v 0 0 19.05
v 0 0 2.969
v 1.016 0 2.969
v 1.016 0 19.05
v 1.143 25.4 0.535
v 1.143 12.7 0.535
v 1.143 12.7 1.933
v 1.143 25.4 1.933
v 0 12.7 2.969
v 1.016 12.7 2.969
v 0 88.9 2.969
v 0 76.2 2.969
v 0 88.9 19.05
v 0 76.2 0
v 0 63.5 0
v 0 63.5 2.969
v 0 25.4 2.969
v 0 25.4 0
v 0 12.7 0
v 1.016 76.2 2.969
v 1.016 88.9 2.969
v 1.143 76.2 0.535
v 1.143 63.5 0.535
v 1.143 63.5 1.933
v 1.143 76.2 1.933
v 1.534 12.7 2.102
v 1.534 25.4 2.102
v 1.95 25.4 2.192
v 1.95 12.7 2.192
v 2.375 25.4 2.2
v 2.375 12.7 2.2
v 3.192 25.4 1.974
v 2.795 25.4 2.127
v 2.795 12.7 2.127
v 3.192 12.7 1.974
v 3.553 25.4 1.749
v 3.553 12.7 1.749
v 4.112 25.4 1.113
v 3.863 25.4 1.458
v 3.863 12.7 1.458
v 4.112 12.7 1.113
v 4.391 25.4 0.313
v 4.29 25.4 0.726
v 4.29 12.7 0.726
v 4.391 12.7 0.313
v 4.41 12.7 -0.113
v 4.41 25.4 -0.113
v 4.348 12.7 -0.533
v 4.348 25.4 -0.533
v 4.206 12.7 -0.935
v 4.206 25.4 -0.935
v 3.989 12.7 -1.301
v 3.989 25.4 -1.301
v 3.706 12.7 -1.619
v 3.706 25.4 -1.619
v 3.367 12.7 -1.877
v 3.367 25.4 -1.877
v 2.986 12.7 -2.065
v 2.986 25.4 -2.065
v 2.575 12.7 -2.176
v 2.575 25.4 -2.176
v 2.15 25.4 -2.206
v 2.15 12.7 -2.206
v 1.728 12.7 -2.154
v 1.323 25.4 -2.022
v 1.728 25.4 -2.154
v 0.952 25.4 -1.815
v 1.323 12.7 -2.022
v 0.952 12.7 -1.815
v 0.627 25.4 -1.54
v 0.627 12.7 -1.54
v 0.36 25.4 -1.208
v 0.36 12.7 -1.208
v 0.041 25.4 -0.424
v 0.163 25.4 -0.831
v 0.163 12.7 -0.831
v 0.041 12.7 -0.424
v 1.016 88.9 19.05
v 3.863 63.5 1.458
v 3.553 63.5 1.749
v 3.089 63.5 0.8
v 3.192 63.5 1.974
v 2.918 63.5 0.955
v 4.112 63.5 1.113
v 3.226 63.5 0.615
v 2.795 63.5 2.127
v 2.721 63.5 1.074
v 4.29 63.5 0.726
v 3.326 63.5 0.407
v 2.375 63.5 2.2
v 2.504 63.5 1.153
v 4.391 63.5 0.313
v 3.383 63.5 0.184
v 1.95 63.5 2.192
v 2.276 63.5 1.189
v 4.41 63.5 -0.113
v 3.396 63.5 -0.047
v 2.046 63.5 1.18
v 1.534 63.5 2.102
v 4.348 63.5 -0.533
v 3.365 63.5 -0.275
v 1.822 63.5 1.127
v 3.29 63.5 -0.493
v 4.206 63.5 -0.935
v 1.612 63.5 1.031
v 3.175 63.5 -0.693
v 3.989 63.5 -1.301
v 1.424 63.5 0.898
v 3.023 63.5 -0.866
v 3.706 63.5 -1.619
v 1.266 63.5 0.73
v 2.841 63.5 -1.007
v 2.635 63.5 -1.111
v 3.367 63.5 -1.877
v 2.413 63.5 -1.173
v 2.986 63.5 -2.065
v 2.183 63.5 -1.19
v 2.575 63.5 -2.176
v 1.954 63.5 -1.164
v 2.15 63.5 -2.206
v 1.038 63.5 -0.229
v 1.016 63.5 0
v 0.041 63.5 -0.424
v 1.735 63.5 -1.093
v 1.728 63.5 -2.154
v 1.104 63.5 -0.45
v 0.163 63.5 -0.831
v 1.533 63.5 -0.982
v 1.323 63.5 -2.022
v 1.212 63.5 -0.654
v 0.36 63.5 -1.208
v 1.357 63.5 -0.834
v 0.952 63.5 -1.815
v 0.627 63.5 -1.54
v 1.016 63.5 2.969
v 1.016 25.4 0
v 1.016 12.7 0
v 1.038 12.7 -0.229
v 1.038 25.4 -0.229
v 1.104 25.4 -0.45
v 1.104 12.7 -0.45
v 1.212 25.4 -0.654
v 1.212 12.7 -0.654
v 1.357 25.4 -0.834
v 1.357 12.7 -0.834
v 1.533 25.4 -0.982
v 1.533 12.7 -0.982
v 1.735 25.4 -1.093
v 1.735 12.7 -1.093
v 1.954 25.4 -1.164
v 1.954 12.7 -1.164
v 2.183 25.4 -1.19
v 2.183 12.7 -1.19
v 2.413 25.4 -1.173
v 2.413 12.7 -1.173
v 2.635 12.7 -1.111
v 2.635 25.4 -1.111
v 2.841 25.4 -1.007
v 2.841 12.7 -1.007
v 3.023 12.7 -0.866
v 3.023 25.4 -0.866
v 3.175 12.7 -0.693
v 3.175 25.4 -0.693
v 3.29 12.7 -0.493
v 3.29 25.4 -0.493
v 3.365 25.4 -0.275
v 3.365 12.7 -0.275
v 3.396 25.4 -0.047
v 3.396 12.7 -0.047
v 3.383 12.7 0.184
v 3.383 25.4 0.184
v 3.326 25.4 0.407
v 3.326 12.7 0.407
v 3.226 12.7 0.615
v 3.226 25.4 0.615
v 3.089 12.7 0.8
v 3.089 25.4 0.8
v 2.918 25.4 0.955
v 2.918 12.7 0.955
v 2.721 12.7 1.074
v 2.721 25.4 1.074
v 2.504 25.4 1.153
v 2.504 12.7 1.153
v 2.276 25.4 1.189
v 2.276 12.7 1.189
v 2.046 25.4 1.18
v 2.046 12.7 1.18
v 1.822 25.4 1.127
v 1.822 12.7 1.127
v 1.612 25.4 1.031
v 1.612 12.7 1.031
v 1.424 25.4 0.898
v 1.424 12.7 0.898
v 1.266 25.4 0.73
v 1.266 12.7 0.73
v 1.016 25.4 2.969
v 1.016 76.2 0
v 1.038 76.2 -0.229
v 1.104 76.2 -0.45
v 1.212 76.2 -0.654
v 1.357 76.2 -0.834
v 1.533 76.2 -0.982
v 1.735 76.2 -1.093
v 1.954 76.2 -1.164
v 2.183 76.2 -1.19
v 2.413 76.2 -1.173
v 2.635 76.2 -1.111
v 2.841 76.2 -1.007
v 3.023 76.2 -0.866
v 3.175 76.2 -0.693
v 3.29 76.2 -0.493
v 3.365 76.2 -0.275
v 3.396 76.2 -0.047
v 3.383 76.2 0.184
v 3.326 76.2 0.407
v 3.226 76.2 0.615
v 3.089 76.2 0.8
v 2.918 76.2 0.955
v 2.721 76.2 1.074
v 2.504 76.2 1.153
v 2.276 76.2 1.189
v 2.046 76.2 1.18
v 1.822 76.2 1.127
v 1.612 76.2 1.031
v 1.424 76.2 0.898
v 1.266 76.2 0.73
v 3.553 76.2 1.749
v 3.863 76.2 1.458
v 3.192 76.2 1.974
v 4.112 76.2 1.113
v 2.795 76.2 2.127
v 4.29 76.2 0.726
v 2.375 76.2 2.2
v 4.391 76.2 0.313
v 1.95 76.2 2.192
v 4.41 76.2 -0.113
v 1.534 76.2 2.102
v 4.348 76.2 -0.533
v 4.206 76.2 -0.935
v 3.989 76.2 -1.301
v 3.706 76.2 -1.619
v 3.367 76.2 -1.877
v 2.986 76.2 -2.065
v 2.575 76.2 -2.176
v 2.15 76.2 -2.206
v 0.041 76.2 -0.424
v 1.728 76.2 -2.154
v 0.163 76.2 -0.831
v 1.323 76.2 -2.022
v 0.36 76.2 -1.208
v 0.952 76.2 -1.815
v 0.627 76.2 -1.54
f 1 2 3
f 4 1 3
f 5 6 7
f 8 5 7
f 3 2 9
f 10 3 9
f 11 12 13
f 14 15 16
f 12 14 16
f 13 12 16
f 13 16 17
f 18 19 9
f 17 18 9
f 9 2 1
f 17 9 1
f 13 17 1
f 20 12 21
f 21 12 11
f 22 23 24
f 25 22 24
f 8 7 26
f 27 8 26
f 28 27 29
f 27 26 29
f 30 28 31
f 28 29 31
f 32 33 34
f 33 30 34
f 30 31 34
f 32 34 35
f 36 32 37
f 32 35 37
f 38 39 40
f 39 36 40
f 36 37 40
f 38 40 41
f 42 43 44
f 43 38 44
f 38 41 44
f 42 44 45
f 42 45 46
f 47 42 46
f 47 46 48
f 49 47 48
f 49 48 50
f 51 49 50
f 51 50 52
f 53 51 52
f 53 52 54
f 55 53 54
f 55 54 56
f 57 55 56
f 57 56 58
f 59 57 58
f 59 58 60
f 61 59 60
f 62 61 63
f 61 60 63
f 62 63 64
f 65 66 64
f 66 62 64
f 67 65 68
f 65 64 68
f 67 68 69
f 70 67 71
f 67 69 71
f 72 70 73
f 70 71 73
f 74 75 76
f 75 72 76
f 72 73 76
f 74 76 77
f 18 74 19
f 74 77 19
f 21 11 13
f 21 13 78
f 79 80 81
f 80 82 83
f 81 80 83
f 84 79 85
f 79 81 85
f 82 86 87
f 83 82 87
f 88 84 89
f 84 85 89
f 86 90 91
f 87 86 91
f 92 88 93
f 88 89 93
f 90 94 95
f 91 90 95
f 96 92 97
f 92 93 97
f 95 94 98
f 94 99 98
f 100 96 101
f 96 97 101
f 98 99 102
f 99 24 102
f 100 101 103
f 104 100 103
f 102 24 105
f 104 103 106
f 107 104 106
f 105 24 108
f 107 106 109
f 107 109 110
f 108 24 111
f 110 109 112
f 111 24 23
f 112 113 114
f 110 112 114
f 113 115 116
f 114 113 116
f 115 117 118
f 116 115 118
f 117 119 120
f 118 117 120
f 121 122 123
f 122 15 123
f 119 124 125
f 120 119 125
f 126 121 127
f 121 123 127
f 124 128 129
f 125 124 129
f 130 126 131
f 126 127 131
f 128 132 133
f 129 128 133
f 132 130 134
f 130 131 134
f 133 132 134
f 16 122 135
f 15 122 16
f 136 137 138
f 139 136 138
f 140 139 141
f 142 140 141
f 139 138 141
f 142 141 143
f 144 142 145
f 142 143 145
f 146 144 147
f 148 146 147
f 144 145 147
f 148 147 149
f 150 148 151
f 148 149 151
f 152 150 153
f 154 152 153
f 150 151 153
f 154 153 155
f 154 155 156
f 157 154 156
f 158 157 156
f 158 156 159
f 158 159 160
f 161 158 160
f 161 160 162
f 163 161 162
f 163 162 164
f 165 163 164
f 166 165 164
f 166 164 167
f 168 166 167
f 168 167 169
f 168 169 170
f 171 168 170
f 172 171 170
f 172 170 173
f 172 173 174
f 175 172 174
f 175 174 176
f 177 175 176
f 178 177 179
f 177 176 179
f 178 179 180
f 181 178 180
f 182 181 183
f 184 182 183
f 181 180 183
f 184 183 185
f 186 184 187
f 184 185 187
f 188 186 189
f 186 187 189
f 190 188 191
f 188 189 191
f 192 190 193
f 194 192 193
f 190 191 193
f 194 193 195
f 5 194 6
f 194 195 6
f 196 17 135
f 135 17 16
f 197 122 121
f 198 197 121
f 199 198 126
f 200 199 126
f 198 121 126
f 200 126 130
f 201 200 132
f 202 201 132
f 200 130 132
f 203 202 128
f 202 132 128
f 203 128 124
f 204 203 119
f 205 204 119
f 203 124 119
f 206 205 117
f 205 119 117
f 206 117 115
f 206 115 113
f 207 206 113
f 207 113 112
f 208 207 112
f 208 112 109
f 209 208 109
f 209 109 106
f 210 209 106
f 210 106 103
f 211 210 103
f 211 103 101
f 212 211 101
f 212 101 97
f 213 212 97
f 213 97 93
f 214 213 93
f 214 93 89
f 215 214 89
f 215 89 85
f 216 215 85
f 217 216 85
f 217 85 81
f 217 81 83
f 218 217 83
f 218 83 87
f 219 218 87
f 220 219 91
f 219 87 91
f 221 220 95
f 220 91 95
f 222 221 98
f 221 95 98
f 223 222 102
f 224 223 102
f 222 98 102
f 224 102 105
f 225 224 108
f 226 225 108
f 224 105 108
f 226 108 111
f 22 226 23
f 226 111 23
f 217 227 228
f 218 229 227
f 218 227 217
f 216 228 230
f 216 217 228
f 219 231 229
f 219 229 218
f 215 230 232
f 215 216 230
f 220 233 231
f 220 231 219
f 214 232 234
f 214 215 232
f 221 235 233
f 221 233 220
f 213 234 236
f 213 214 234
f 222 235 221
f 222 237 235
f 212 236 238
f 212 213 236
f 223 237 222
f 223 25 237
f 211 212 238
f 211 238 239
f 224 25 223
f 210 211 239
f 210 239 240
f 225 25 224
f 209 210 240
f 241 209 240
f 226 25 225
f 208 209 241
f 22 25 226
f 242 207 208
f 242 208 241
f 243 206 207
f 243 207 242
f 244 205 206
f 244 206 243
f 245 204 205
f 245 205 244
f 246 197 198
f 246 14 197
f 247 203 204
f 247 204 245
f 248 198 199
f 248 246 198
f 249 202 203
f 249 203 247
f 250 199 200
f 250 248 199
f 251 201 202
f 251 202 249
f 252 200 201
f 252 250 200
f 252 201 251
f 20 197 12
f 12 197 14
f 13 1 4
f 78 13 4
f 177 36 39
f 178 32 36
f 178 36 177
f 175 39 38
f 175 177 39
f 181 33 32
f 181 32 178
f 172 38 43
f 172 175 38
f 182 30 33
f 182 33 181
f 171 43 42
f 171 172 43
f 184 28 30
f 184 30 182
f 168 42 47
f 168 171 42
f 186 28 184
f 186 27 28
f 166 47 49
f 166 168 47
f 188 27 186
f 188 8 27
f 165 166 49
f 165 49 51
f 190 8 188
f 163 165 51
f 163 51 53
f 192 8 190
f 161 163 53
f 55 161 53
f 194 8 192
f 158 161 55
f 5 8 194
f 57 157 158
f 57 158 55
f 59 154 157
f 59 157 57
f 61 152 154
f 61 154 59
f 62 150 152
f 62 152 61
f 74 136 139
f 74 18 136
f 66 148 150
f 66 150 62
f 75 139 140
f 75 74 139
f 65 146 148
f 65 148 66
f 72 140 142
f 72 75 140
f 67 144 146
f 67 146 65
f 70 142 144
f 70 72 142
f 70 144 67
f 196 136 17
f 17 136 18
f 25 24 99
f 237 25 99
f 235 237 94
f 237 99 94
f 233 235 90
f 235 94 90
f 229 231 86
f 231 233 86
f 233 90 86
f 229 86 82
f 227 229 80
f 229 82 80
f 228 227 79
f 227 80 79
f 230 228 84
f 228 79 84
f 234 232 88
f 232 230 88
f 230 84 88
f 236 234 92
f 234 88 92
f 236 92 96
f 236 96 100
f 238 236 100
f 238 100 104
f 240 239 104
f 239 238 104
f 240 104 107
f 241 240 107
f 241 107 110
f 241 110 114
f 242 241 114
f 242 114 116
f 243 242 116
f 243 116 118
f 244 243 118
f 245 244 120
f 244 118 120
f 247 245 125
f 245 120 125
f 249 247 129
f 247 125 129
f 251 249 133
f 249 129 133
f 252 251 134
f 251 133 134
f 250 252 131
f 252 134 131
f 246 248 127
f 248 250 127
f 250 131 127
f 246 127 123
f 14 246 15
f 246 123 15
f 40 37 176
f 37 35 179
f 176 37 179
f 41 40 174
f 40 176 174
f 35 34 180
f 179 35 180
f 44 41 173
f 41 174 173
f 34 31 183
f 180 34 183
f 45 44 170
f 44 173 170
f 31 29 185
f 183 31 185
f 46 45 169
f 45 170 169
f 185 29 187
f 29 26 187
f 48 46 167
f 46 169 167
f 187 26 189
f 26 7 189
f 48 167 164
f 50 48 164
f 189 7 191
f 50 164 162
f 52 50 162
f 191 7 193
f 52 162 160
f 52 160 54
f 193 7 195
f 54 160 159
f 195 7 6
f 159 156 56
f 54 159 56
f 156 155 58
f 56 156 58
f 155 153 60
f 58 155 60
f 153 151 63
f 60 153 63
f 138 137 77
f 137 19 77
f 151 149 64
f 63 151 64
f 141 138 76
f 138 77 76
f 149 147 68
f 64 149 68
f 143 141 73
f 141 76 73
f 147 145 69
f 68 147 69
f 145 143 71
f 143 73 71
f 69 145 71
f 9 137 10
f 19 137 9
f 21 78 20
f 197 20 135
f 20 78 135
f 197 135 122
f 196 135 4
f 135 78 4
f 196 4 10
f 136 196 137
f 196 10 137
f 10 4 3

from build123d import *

# Parameters (mm, degrees)
BOSS_EXTRUDE2_DEPTH = 88.9
SKETCH8_W           = 5.93725
SKETCH8_H           = 12.7
CUT_EXTRUDE3_DEPTH  = 92.025212307
SKETCH10_W          = 5.93725
SKETCH10_H          = 12.7
CUT_EXTRUDE4_DEPTH  = 92.025212307


with BuildPart() as part:
    # Sketch4 → Boss-Extrude2 (new body)
    with BuildSketch(Plane(origin=(0, 0, 0), x_dir=(1, 0, 0), z_dir=(0, 1, 0))):
        with BuildLine():
            Line((0, 0), (0, -19.05))
            Line((0, -19.05), (1.016, -19.05))
            Line((1.016, -19.05), (1.016, 0))
            ThreePointArc((1.016, 0), (3.365064987, 0.274963066), (1.143, -0.535060511))
            Line((1.143, -0.535060511), (1.143, -1.933363843))
            ThreePointArc((1.143, -1.933363843), (4.106126962, 1.122980938), (0, 0))
        make_face()
    extrude(amount=BOSS_EXTRUDE2_DEPTH)

    # Sketch8 → Cut-Extrude3 (cut, through all)
    with BuildSketch(Plane(origin=(0, 0, 0), x_dir=(0, 0, -1), z_dir=(1, 0, 0))):
        with Locations((0, 6.35)):
            Rectangle(SKETCH8_W, SKETCH8_H)
        with Locations((0, 31.75)):
            Rectangle(SKETCH8_W, SKETCH8_H)
        with Locations((0, 57.15)):
            Rectangle(SKETCH8_W, SKETCH8_H)
        with Locations((0, 82.55)):
            Rectangle(SKETCH8_W, SKETCH8_H)
    extrude(amount=CUT_EXTRUDE3_DEPTH, mode=Mode.SUBTRACT)

    # Sketch10 → Cut-Extrude4 (cut, through all)
    with BuildSketch(Plane(origin=(0, 0, 0), x_dir=(0, 0, -1), z_dir=(1, 0, 0))):
        with Locations((0, 44.45)):
            Rectangle(SKETCH10_W, SKETCH10_H)
    extrude(amount=CUT_EXTRUDE4_DEPTH, mode=Mode.SUBTRACT)


solid = part.part
